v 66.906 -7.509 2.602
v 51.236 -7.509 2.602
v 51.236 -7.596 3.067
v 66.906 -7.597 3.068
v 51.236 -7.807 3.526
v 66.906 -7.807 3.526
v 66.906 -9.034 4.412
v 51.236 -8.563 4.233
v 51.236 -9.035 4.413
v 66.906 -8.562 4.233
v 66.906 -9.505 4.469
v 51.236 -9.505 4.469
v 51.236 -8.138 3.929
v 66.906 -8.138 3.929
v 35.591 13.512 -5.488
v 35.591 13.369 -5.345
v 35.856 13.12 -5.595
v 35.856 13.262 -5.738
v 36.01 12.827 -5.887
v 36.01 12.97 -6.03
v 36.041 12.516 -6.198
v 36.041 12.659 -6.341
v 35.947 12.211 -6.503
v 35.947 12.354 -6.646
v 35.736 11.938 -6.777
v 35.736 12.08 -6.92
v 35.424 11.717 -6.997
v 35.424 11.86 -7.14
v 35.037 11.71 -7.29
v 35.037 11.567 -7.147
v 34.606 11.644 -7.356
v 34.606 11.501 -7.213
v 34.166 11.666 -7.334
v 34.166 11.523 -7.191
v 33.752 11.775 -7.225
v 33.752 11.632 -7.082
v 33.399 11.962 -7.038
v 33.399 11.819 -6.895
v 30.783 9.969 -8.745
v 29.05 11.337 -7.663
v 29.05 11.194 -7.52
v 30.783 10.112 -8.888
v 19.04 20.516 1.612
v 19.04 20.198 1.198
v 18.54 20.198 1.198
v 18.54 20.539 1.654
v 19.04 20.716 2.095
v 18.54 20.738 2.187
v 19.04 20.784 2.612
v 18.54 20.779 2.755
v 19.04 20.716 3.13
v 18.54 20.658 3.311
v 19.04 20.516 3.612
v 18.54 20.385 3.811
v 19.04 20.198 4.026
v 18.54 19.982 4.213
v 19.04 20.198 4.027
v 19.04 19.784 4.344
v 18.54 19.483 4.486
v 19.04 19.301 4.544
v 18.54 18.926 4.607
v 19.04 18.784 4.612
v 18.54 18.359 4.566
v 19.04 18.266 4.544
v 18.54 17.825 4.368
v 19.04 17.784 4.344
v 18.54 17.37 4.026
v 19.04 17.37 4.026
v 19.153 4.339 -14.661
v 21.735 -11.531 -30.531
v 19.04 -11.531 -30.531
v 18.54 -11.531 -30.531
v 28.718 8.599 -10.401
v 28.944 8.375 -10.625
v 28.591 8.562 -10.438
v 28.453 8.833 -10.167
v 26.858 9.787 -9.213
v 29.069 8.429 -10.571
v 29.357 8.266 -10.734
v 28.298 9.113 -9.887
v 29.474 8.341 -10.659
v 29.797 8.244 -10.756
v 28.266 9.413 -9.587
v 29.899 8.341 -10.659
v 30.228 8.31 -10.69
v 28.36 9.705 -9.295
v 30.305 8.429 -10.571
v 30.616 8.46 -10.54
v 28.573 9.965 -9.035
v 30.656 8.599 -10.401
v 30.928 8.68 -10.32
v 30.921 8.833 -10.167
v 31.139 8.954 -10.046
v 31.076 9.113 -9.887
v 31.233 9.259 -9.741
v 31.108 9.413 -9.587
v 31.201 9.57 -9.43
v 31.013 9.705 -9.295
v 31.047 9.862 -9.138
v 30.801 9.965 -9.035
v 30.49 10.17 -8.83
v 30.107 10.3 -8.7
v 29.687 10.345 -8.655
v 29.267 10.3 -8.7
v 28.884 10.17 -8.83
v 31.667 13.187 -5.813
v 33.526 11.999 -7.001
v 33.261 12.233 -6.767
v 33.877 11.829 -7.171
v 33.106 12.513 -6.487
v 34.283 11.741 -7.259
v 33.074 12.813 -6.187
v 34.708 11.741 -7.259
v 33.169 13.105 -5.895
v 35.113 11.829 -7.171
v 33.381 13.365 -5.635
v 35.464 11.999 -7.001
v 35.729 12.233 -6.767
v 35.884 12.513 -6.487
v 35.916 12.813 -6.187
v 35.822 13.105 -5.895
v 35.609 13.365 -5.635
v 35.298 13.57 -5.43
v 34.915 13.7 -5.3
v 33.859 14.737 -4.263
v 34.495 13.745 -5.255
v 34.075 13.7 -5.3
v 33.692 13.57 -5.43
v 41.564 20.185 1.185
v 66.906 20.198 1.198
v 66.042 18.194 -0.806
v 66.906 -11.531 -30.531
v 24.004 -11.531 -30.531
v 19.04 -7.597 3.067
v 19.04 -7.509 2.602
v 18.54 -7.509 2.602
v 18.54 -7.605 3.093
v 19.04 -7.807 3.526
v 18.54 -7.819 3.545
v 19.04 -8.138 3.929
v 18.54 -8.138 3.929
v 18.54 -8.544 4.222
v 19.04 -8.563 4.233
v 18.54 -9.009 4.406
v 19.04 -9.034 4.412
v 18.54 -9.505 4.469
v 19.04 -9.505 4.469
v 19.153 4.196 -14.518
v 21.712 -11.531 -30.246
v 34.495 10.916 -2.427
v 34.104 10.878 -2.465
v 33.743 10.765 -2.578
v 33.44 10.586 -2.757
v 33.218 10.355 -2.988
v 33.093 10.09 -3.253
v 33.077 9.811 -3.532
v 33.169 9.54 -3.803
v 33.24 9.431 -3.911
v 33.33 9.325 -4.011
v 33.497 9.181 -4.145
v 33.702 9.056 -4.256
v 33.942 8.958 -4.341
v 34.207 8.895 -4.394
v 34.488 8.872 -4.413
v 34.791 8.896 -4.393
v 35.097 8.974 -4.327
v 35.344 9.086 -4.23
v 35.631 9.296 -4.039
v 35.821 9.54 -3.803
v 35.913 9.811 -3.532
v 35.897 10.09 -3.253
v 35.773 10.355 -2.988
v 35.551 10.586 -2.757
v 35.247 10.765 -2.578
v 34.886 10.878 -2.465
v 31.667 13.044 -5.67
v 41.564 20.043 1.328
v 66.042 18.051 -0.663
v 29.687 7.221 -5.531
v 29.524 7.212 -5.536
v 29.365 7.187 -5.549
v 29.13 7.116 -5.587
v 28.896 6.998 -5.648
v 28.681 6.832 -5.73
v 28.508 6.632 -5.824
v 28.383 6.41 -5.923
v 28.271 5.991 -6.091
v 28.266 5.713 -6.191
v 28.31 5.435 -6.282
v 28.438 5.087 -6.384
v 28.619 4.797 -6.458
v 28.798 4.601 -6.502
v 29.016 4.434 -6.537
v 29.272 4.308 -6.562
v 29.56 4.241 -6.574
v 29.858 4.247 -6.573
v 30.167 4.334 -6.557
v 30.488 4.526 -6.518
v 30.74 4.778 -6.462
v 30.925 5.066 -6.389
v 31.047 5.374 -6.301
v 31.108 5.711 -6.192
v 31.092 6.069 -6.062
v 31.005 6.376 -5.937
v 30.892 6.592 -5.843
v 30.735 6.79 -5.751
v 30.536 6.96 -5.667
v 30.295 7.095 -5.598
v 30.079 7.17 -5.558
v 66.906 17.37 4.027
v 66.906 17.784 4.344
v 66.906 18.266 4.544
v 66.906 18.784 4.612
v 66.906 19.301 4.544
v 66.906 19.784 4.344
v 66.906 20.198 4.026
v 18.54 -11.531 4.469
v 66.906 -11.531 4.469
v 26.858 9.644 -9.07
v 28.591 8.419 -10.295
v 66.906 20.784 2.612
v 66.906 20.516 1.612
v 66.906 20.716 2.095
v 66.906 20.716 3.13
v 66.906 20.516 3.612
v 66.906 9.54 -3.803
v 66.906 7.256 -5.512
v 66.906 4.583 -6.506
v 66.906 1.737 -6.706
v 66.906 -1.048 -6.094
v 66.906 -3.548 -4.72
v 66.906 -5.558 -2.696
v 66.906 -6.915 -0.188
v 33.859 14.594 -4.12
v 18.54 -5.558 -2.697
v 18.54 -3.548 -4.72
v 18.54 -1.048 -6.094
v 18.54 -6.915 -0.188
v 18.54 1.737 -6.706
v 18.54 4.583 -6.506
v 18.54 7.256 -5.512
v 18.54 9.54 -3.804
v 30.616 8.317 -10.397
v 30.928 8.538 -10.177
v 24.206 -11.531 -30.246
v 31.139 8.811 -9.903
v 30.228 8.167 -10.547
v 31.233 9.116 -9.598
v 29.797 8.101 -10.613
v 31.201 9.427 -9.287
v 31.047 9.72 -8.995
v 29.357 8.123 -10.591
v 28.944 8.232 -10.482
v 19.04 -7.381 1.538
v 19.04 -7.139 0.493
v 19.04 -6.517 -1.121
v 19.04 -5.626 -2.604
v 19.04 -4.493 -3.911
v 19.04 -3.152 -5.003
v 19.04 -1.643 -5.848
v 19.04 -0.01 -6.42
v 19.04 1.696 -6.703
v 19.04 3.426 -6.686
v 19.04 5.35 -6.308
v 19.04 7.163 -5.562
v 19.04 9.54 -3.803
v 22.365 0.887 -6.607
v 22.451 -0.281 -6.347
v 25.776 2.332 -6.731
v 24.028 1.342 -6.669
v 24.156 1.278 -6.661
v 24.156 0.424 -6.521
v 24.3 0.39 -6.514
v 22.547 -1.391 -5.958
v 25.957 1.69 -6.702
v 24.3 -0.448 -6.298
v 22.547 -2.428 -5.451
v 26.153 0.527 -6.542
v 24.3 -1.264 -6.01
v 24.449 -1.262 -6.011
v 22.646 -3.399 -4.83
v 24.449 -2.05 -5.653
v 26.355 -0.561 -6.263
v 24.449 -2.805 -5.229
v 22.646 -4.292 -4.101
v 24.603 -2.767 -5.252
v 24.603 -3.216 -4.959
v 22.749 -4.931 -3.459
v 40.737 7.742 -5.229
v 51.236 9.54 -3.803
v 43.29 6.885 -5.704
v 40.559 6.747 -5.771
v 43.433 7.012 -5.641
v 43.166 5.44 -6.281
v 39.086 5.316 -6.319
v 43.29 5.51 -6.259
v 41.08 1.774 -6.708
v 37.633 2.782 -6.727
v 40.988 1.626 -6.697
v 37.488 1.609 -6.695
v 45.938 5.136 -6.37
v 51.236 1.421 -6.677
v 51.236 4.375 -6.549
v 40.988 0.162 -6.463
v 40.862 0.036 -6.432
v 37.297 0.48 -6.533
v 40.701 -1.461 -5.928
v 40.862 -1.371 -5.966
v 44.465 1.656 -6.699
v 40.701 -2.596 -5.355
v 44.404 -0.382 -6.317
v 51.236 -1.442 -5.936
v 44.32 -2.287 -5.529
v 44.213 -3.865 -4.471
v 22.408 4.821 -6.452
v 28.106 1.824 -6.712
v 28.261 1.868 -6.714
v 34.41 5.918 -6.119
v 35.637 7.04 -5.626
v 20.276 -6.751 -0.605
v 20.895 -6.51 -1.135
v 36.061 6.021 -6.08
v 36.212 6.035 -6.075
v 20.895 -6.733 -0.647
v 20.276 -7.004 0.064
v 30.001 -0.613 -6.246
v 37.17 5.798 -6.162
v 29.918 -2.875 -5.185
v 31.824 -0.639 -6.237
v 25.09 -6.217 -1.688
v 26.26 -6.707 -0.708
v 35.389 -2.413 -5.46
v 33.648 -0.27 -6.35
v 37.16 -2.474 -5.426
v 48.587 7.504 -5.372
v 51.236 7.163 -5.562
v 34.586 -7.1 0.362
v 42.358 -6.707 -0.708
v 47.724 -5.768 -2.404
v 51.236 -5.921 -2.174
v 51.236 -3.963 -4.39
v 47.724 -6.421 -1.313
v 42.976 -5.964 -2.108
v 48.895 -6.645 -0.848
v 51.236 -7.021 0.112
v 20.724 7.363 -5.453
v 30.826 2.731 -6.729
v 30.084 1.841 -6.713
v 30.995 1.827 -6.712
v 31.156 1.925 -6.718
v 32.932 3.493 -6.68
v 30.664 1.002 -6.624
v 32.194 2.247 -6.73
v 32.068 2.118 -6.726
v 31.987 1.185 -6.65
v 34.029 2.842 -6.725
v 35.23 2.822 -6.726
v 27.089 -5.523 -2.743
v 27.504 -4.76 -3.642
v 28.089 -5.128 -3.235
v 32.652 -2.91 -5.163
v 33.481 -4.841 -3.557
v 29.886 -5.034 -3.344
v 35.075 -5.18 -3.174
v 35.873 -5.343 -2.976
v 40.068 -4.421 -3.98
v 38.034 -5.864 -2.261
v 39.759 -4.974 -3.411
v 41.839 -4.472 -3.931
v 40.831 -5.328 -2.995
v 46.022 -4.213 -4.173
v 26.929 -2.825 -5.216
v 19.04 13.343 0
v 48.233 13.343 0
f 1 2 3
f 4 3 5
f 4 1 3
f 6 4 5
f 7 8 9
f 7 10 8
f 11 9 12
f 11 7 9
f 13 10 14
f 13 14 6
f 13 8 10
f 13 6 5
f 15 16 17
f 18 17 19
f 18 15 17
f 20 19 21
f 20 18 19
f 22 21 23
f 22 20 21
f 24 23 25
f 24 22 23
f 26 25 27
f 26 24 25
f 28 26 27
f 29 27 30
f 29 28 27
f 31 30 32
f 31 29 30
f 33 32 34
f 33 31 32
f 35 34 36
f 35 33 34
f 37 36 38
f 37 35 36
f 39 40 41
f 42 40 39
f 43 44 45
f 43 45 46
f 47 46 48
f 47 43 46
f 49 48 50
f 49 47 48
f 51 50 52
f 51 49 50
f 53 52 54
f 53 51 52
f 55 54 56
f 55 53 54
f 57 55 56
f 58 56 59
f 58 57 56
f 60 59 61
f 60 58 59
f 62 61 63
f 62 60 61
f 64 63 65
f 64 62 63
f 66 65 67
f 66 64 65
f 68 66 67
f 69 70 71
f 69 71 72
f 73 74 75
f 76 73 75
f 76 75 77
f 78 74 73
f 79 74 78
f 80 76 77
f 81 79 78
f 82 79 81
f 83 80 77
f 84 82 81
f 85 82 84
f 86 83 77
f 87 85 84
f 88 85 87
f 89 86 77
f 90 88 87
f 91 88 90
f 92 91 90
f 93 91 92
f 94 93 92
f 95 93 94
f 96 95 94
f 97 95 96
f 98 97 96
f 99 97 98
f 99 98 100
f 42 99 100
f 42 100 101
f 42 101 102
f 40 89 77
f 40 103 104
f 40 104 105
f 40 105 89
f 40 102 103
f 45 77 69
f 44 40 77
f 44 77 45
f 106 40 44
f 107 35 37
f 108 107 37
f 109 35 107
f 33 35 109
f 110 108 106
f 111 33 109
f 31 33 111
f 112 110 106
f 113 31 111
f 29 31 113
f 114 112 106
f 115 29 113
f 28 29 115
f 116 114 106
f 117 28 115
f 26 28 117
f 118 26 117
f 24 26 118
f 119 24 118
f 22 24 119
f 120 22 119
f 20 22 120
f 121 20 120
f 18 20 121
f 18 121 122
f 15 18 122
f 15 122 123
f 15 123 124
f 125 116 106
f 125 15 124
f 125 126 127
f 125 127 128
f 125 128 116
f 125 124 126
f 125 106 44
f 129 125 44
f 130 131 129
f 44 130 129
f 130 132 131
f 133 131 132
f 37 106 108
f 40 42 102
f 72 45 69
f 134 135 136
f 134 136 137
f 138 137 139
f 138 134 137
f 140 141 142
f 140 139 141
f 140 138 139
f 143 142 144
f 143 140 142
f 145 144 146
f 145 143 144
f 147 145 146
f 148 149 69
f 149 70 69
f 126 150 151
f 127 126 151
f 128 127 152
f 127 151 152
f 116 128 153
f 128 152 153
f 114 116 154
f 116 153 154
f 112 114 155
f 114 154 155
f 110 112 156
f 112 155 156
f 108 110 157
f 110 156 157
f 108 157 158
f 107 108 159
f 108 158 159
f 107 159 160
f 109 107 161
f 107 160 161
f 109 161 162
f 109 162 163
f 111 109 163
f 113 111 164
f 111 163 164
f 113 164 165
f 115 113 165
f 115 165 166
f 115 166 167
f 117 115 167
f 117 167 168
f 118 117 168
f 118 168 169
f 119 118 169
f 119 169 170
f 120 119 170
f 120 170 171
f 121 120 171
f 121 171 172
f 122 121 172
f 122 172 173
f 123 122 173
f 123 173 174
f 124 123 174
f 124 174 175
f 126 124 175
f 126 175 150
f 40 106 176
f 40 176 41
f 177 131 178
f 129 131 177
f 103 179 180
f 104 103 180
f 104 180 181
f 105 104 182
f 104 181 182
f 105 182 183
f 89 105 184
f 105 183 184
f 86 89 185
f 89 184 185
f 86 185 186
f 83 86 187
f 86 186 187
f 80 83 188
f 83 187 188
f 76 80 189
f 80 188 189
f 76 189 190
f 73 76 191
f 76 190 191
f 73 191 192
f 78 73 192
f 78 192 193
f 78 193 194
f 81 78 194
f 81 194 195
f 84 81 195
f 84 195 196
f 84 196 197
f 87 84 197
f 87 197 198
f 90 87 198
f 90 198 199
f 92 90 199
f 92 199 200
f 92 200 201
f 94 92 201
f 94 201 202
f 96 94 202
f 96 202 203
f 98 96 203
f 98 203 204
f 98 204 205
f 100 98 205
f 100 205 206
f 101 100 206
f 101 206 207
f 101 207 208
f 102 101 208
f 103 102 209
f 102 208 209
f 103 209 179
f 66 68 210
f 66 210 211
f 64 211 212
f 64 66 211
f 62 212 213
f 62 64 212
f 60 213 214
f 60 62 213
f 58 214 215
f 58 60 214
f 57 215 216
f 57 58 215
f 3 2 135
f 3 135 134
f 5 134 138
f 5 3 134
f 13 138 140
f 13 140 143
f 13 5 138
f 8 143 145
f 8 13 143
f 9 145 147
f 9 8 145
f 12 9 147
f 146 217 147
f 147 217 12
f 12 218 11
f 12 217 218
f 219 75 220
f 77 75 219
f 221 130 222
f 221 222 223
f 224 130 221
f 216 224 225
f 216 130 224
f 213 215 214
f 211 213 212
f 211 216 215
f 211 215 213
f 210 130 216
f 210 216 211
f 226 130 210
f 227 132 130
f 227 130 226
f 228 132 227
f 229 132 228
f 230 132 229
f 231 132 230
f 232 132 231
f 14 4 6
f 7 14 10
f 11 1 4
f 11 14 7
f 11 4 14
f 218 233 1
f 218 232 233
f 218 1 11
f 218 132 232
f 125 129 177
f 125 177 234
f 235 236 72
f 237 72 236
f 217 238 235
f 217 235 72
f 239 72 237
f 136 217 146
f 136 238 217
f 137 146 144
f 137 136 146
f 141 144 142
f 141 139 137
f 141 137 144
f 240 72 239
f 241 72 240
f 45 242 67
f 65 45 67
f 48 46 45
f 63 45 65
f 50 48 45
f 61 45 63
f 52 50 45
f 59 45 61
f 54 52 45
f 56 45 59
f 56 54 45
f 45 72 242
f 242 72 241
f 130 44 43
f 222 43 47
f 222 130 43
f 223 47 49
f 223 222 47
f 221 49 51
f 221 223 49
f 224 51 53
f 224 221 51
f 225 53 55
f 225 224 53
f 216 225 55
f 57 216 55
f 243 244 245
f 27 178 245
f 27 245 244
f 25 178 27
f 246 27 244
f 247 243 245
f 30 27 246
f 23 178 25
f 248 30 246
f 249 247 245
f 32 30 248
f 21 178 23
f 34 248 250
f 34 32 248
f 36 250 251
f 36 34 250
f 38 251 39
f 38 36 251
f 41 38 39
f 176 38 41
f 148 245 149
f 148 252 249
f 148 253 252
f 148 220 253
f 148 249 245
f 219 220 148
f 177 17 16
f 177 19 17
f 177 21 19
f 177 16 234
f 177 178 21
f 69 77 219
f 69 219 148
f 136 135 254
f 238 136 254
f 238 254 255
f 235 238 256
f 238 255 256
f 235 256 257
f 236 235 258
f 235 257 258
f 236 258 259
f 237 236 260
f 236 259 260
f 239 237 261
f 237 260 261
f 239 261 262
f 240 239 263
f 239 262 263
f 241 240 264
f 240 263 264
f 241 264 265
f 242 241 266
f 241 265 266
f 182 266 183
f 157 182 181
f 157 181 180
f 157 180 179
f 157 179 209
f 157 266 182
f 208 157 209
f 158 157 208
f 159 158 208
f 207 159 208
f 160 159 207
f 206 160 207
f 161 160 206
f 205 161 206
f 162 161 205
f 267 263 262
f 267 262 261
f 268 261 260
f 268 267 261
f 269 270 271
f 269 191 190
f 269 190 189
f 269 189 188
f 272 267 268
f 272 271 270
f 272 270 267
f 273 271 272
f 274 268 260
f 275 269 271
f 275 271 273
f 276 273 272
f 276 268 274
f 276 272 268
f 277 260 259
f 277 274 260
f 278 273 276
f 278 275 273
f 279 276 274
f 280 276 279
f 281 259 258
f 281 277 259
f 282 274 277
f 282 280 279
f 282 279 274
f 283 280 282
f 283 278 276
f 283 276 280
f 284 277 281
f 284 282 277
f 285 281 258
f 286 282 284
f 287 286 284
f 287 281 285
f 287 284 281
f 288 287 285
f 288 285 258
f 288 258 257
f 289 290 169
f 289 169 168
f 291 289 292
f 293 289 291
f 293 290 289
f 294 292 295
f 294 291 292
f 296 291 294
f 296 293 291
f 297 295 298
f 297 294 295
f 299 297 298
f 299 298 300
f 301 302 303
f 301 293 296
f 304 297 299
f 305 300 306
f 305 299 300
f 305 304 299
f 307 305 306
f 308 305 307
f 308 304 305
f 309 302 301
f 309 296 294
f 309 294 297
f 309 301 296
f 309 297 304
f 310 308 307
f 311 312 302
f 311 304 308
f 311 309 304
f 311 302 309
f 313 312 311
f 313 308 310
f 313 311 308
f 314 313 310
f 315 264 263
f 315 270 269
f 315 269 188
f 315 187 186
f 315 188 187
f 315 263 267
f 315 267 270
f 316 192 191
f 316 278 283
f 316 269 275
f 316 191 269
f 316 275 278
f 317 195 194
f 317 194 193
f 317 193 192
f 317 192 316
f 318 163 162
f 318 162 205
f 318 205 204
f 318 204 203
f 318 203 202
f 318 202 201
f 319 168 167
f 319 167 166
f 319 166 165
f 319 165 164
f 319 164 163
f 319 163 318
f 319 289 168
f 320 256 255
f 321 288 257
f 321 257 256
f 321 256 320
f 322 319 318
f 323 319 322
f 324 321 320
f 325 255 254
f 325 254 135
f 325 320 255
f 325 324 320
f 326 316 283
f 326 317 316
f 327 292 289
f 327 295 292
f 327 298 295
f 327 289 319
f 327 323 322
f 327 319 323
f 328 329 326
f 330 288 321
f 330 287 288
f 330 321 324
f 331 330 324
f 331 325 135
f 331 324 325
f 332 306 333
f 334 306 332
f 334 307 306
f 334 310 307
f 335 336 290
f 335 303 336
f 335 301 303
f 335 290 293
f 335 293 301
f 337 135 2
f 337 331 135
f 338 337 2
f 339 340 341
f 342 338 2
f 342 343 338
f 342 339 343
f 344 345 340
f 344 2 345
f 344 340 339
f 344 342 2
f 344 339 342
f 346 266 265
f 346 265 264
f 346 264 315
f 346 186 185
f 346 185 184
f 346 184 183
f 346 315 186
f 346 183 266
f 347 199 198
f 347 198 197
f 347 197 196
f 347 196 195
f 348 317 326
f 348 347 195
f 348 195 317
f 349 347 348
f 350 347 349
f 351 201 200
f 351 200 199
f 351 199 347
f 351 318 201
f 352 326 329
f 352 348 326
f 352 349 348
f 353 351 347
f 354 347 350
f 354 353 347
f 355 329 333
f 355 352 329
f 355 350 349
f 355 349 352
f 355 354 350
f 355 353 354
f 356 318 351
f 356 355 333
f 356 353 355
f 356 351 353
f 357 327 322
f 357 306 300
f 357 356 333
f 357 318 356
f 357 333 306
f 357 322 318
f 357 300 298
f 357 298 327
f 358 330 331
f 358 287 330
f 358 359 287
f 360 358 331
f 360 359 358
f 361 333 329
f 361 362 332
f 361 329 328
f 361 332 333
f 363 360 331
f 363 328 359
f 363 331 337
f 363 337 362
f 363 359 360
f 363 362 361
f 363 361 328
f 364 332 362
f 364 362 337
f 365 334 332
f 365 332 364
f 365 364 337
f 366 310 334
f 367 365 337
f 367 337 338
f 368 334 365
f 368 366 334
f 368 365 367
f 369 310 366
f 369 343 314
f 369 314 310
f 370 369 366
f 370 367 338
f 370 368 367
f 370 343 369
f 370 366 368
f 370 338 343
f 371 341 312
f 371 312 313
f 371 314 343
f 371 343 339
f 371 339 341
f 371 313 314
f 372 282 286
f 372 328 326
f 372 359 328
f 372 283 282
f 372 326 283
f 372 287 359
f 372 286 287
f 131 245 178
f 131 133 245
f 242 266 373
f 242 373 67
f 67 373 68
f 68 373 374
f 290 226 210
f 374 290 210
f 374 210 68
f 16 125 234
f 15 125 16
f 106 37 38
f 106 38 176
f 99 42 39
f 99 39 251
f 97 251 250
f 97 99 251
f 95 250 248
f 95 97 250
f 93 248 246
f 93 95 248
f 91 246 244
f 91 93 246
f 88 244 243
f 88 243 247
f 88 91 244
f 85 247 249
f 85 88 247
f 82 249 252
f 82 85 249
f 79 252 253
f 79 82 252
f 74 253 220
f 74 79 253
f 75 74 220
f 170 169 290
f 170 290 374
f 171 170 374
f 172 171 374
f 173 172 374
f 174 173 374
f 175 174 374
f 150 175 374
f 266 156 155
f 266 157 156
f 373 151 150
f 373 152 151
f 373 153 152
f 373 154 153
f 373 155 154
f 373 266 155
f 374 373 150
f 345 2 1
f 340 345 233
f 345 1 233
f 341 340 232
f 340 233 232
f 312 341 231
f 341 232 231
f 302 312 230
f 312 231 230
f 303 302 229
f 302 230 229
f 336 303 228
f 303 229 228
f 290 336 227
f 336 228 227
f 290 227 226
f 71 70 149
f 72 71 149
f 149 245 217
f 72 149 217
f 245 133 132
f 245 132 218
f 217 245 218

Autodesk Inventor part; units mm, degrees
sketch "Sketch1" plane through (0, 0, 0) normal (1, 0, 0) x (0, 1, 0)
  line L0 (0, 0) -> (0, -19)
  line L1 (0, -19) -> (19, 0)
  line L2 (0, -19) -> (9.9437, -19) construction
  line L3 (0, -19) -> (19, 0)
  line L4 (19, 0) -> (0, 0)
  dimension "d0" = 19
  dimension "d1" = 45
extrude "Extrusion1" add sketch "Sketch1" along normal blind 61
sketch "Sketch2" plane through (61, 19, 0) normal (0, 0.7071068, -0.7071068) x (-1, 0, 0)
  line L0 (47, 0) -> (15, 0)
  line L1 (61, -26.8701) -> (0, -26.8701) projected
  line L2 (61, -26.8701) -> (0, -26.8701)
  line L3 (61, 0) -> (0, 0) projected
  line L4 (47, 0) -> (61, 0)
  line L5 (61, -26.8701) -> (61, 0) projected
  line L6 (61, 0) -> (61, -26.8701)
  line L7 (0, -26.8701) -> (0, 0) projected
  line L8 (0, 0) -> (0, -26.8701)
  line L9 (15, 0) -> (0, -26.8701)
  line L10 (47, 0) -> (61, -26.8701)
  point P0 (31, 0)
  point P1 (31, 0)
  dimension "d4" = 32
sketch "Sketch3" plane through (0, 0, 0) normal (-1, 0, 0) x (0, 0, 1)
  line L0 (-19, 0) -> (0, 19) projected
  line L1 (0, 19) -> (-12.7279, 6.2721)
  line L2 (-12.7279, 6.2721) -> (-9.8995, 3.4437)
  line L3 (-9.8995, 3.4437) -> (0, 13.3431)
  line L4 (0, 19) -> (0, 0) projected
  line L5 (-9.8995, 3.4437) -> (0, 3.4437)
  dimension "d5" = 18
  dimension "d6" = 4
extrude "Extrusion2" cut sketch "Sketch3" against normal blind 62 contours L3 L4 L5
sketch "Sketch4" plane through (61, 0, -19) normal (0, 0.7071068, -0.7071068) x (-1, 0, 0)
  line L0 (61, 26.8701) -> (0, 26.8701) construction
  line L1 (30.5, 26.8701) -> (30.5, 0) construction
  line L2 (61, 0) -> (0, 0) construction
  line L3 (30.5, 17.2) -> (30.5, -1.6) construction
  line L4 (52.0668, -4.3668) -> (8.9332, 38.7668) construction
  line L5 (41.9599, 0) -> (41.9599, -16.3079)
  line L6 (41.9599, -16.3079) -> (-10.9063, -16.3079)
  line L7 (-10.9063, -16.3079) -> (-10.9063, 26.8701)
  line L8 (17.1357, 30.5643) -> (-10.9063, 30.5643)
  line L9 (-10.9063, 30.5643) -> (-10.9063, 26.8701)
  line L10 (17.1357, 30.5643) -> (41.9599, 30.5643)
  line L11 (41.9599, 0) -> (41.9599, 30.5643)
  line L12 (36.9964, -16.3079) -> (-5.0421, 25.7306)
  line L13 (-5.0421, 25.7306) -> (19.4362, 28.5467)
  line L14 (19.4362, 28.5467) -> (27.1412, 20.8416)
  line L15 (27.1412, 20.8416) -> (25.4088, 19.1092)
  arc A0 (25.4088, 19.1092) -> (27.6009, 16.9172) centre (26.5048, 18.0132) ccw
  line L16 (27.6009, 16.9172) -> (29.3333, 18.6496)
  line L17 (39.262, -16.3307) -> (41.8467, 6.1362)
  line L18 (29.3333, 18.6496) -> (31.9496, 16.0333)
  line L19 (31.9496, 16.0333) -> (30.2172, 14.3009)
  arc A1 (30.2172, 14.3009) -> (32.4092, 12.1088) centre (31.3132, 13.2048) ccw
  line L20 (32.4092, 12.1088) -> (34.1416, 13.8412)
  line L21 (34.1416, 13.8412) -> (41.8467, 6.1362)
  line L22 (29.1919, 18.5081) -> (29.3333, 18.6496)
  line L23 (29.3333, 18.6496) -> (29.4747, 18.5081)
  point P0 (61, 13.435)
  point P1 (47, 26.8701)
  point P2 (15, 26.8701)
  dimension "d13" = 18.8
  dimension "d14" = 1.6
extrude "Extrusion4" cut sketch "Sketch2" against normal blind 62 contours L3 L5 L10 | L9 L7 L3
sketch "Sketch5" plane through (61, 0, -19) normal (0, 0.7071068, -0.7071068) x (-1, 0, 0)
  point P0 (61, 13.435)
extrude "Extrusion5" add sketch "Sketch4" against normal up to surface (4 mm away)
sketch "Sketch6" plane through (19.0401, 0, -19) normal (-1, 0, 0) x (0, 0, 1)
  line L0 (-11.5314, -11.5314) -> (-5.8745, -11.5314)
  line L1 (5.6569, 0) -> (-5.8745, -11.5314)
  line L2 (-11.5314, -11.5314) -> (0, 0)
  line L3 (21.6122, 21.6122) -> (-11.5314, -11.5314) projected
  line L4 (19, 0) -> (0, 0) projected
  line L5 (5.6569, 0) -> (0, 0)
  line L6 (-11.5314, -11.5314) -> (-8.703, -14.3598) projected
  line L7 (-11.5314, -11.5314) -> (-8.703, -14.3598)
  line L8 (-8.703, -14.3598) -> (-5.8745, -11.5314)
extrude "Extrusion6" cut sketch "Sketch6" against normal blind 62 contours L0 L8 L6
ref_plane "Work Plane2" through (19.0401, 0, -19) normal (-1, 0, 0) x (0, 0, 1)
split "Split1" plane through (19.0401, 0, -19) removes the side toward (-1, 0, 0)
ref_plane "Work Plane3" through (19.0401, 18.7838, 5.4407) normal (0, -0.7071068, 0.7071068) x (1, 0, 0)
split "Split2" plane through (19.0401, 18.7838, 5.4407) removes the side toward (0, -0.7071068, 0.7071068)
sketch "Sketch7" plane through (19.0401, -11.5314, -30.5314) normal (-1, 0, 0) x (0, 0, 1)
  line L0 (5.6569, 0) -> (0, 0) projected
  line L1 (0, 0) -> (35, 0)
  line L2 (35, 0) -> (35, 4)
  line L3 (35, 4) -> (4, 4)
  line L4 (0, 0) -> (33.1436, 33.1436) projected
  line L5 (4, 4) -> (0, 0)
  point P0 (30.5314, 11.5314)
  dimension "d29" = 35
  dimension "d30" = 4
extrude "Extrusion7" add sketch "Sketch7" against normal up to surface (52.8662 mm away)
sketch "Sketch8" plane through (71.9063, 21.6122, 2.6122) normal (0, 0.7071068, -0.7071068) x (-1, 0, 0)
  line L0 (30.3425, -2.0177) -> (38.0475, -9.7227)
  line L1 (62.973, -34.9311) -> (19.8395, 8.2024) construction
  line L2 (38.0475, -9.7227) -> (36.3151, -11.4551)
  arc A0 (36.3151, -11.4551) -> (38.5071, -13.6472) centre (37.4111, -12.5511) ccw
  line L3 (38.5071, -13.6472) -> (40.2395, -11.9147)
  line L4 (40.2395, -11.9147) -> (42.8558, -14.531)
  line L5 (42.8558, -14.531) -> (41.1234, -16.2635)
  arc A1 (41.1234, -16.2635) -> (43.3155, -18.4555) centre (42.2194, -17.3595) ccw
  line L6 (43.3155, -18.4555) -> (45.0479, -16.7231)
  line L7 (45.0479, -16.7231) -> (52.7529, -24.4281)
  line L8 (50.1709, -46.8722) -> (52.7529, -24.4281)
  line L9 (47.9026, -46.8722) -> (5.8642, -4.8337)
  line L10 (5.8642, -4.8337) -> (30.3425, -2.0177)
  line L11 (52.8662, -46.8722) -> (0, -46.8722)
  point P0 (71.9063, -17.1293)
extrude "Extrusion8" cut sketch "Sketch8" against normal blind 0.2
fillet "Fillet1" radius 10 1 edges at (45.4732, -7.5314, -20.8745)
fillet "Fillet1" radius 2 3 edges at (45.4732, -7.5314, 4.4686) (45.4732, 18.7838, 5.4407) (45.4732, 21.6122, 2.6122)
sketch "Sketch9" plane through (71.9063, -11.5314, -30.5314) normal (0, 0.7071068, -0.7071068) x (-1, 0, 0)
  arc A0 (36.3151, 35.417) -> (38.5071, 33.225) centre (37.4111, 34.321) ccw projected
  point P0 (71.9063, 29.7429)
hole "Hole1" at (34.4952, 12.7372, -6.2628) direction (0, -0.7071068, 0.7071068) diameter 2.85 end through all
sketch "Sketch10" plane through (71.9063, -11.5314, -30.5314) normal (0, 0.7071068, -0.7071068) x (-1, 0, 0)
  arc A0 (41.1234, 30.6087) -> (43.3155, 28.4167) centre (42.2194, 29.5127) ccw projected
  point P0 (71.9063, 29.7429)
hole "Hole2" at (29.6868, 9.3372, -9.6628) direction (0, -0.7071068, 0.7071068) diameter 2.85 end through all
ref_plane "Work Plane4" through (66.9063, -11.5314, 4.4686) normal (1, 0, 0) x (0, 0, -1)
split "Split3" plane through (66.9063, -11.5314, 4.4686) removes the side toward (1, 0, 0)
sketch "Sketch11" plane through (19.0401, -11.5314, -30.5314) normal (-1, 0, 0) x (0, 0, 1)
  arc A0 (34.5578, 28.901) -> (31.7294, 31.7294) centre (33.1436, 30.3152) ccw projected
  line L0 (0, 0) -> (31.7294, 31.7294) projected
  line L1 (0, 0) -> (35, 0) projected
  line L2 (35, 0) -> (35, 2.0266) projected
  arc A1 (35, 2.0266) -> (33.1332, 4.0222) centre (33, 2.0266) ccw projected
  arc A2 (26.7279, 21.0711) -> (33.1332, 4.0222) centre (33.799, 14) ccw projected
  line L3 (26.7279, 21.0711) -> (34.5578, 28.901) projected
  point P0 (30.5314, 11.5314)
extrude "Extrusion9" add sketch "Sketch11" along normal blind 0.5
properties part number "cutter" material "PET Plastic"
